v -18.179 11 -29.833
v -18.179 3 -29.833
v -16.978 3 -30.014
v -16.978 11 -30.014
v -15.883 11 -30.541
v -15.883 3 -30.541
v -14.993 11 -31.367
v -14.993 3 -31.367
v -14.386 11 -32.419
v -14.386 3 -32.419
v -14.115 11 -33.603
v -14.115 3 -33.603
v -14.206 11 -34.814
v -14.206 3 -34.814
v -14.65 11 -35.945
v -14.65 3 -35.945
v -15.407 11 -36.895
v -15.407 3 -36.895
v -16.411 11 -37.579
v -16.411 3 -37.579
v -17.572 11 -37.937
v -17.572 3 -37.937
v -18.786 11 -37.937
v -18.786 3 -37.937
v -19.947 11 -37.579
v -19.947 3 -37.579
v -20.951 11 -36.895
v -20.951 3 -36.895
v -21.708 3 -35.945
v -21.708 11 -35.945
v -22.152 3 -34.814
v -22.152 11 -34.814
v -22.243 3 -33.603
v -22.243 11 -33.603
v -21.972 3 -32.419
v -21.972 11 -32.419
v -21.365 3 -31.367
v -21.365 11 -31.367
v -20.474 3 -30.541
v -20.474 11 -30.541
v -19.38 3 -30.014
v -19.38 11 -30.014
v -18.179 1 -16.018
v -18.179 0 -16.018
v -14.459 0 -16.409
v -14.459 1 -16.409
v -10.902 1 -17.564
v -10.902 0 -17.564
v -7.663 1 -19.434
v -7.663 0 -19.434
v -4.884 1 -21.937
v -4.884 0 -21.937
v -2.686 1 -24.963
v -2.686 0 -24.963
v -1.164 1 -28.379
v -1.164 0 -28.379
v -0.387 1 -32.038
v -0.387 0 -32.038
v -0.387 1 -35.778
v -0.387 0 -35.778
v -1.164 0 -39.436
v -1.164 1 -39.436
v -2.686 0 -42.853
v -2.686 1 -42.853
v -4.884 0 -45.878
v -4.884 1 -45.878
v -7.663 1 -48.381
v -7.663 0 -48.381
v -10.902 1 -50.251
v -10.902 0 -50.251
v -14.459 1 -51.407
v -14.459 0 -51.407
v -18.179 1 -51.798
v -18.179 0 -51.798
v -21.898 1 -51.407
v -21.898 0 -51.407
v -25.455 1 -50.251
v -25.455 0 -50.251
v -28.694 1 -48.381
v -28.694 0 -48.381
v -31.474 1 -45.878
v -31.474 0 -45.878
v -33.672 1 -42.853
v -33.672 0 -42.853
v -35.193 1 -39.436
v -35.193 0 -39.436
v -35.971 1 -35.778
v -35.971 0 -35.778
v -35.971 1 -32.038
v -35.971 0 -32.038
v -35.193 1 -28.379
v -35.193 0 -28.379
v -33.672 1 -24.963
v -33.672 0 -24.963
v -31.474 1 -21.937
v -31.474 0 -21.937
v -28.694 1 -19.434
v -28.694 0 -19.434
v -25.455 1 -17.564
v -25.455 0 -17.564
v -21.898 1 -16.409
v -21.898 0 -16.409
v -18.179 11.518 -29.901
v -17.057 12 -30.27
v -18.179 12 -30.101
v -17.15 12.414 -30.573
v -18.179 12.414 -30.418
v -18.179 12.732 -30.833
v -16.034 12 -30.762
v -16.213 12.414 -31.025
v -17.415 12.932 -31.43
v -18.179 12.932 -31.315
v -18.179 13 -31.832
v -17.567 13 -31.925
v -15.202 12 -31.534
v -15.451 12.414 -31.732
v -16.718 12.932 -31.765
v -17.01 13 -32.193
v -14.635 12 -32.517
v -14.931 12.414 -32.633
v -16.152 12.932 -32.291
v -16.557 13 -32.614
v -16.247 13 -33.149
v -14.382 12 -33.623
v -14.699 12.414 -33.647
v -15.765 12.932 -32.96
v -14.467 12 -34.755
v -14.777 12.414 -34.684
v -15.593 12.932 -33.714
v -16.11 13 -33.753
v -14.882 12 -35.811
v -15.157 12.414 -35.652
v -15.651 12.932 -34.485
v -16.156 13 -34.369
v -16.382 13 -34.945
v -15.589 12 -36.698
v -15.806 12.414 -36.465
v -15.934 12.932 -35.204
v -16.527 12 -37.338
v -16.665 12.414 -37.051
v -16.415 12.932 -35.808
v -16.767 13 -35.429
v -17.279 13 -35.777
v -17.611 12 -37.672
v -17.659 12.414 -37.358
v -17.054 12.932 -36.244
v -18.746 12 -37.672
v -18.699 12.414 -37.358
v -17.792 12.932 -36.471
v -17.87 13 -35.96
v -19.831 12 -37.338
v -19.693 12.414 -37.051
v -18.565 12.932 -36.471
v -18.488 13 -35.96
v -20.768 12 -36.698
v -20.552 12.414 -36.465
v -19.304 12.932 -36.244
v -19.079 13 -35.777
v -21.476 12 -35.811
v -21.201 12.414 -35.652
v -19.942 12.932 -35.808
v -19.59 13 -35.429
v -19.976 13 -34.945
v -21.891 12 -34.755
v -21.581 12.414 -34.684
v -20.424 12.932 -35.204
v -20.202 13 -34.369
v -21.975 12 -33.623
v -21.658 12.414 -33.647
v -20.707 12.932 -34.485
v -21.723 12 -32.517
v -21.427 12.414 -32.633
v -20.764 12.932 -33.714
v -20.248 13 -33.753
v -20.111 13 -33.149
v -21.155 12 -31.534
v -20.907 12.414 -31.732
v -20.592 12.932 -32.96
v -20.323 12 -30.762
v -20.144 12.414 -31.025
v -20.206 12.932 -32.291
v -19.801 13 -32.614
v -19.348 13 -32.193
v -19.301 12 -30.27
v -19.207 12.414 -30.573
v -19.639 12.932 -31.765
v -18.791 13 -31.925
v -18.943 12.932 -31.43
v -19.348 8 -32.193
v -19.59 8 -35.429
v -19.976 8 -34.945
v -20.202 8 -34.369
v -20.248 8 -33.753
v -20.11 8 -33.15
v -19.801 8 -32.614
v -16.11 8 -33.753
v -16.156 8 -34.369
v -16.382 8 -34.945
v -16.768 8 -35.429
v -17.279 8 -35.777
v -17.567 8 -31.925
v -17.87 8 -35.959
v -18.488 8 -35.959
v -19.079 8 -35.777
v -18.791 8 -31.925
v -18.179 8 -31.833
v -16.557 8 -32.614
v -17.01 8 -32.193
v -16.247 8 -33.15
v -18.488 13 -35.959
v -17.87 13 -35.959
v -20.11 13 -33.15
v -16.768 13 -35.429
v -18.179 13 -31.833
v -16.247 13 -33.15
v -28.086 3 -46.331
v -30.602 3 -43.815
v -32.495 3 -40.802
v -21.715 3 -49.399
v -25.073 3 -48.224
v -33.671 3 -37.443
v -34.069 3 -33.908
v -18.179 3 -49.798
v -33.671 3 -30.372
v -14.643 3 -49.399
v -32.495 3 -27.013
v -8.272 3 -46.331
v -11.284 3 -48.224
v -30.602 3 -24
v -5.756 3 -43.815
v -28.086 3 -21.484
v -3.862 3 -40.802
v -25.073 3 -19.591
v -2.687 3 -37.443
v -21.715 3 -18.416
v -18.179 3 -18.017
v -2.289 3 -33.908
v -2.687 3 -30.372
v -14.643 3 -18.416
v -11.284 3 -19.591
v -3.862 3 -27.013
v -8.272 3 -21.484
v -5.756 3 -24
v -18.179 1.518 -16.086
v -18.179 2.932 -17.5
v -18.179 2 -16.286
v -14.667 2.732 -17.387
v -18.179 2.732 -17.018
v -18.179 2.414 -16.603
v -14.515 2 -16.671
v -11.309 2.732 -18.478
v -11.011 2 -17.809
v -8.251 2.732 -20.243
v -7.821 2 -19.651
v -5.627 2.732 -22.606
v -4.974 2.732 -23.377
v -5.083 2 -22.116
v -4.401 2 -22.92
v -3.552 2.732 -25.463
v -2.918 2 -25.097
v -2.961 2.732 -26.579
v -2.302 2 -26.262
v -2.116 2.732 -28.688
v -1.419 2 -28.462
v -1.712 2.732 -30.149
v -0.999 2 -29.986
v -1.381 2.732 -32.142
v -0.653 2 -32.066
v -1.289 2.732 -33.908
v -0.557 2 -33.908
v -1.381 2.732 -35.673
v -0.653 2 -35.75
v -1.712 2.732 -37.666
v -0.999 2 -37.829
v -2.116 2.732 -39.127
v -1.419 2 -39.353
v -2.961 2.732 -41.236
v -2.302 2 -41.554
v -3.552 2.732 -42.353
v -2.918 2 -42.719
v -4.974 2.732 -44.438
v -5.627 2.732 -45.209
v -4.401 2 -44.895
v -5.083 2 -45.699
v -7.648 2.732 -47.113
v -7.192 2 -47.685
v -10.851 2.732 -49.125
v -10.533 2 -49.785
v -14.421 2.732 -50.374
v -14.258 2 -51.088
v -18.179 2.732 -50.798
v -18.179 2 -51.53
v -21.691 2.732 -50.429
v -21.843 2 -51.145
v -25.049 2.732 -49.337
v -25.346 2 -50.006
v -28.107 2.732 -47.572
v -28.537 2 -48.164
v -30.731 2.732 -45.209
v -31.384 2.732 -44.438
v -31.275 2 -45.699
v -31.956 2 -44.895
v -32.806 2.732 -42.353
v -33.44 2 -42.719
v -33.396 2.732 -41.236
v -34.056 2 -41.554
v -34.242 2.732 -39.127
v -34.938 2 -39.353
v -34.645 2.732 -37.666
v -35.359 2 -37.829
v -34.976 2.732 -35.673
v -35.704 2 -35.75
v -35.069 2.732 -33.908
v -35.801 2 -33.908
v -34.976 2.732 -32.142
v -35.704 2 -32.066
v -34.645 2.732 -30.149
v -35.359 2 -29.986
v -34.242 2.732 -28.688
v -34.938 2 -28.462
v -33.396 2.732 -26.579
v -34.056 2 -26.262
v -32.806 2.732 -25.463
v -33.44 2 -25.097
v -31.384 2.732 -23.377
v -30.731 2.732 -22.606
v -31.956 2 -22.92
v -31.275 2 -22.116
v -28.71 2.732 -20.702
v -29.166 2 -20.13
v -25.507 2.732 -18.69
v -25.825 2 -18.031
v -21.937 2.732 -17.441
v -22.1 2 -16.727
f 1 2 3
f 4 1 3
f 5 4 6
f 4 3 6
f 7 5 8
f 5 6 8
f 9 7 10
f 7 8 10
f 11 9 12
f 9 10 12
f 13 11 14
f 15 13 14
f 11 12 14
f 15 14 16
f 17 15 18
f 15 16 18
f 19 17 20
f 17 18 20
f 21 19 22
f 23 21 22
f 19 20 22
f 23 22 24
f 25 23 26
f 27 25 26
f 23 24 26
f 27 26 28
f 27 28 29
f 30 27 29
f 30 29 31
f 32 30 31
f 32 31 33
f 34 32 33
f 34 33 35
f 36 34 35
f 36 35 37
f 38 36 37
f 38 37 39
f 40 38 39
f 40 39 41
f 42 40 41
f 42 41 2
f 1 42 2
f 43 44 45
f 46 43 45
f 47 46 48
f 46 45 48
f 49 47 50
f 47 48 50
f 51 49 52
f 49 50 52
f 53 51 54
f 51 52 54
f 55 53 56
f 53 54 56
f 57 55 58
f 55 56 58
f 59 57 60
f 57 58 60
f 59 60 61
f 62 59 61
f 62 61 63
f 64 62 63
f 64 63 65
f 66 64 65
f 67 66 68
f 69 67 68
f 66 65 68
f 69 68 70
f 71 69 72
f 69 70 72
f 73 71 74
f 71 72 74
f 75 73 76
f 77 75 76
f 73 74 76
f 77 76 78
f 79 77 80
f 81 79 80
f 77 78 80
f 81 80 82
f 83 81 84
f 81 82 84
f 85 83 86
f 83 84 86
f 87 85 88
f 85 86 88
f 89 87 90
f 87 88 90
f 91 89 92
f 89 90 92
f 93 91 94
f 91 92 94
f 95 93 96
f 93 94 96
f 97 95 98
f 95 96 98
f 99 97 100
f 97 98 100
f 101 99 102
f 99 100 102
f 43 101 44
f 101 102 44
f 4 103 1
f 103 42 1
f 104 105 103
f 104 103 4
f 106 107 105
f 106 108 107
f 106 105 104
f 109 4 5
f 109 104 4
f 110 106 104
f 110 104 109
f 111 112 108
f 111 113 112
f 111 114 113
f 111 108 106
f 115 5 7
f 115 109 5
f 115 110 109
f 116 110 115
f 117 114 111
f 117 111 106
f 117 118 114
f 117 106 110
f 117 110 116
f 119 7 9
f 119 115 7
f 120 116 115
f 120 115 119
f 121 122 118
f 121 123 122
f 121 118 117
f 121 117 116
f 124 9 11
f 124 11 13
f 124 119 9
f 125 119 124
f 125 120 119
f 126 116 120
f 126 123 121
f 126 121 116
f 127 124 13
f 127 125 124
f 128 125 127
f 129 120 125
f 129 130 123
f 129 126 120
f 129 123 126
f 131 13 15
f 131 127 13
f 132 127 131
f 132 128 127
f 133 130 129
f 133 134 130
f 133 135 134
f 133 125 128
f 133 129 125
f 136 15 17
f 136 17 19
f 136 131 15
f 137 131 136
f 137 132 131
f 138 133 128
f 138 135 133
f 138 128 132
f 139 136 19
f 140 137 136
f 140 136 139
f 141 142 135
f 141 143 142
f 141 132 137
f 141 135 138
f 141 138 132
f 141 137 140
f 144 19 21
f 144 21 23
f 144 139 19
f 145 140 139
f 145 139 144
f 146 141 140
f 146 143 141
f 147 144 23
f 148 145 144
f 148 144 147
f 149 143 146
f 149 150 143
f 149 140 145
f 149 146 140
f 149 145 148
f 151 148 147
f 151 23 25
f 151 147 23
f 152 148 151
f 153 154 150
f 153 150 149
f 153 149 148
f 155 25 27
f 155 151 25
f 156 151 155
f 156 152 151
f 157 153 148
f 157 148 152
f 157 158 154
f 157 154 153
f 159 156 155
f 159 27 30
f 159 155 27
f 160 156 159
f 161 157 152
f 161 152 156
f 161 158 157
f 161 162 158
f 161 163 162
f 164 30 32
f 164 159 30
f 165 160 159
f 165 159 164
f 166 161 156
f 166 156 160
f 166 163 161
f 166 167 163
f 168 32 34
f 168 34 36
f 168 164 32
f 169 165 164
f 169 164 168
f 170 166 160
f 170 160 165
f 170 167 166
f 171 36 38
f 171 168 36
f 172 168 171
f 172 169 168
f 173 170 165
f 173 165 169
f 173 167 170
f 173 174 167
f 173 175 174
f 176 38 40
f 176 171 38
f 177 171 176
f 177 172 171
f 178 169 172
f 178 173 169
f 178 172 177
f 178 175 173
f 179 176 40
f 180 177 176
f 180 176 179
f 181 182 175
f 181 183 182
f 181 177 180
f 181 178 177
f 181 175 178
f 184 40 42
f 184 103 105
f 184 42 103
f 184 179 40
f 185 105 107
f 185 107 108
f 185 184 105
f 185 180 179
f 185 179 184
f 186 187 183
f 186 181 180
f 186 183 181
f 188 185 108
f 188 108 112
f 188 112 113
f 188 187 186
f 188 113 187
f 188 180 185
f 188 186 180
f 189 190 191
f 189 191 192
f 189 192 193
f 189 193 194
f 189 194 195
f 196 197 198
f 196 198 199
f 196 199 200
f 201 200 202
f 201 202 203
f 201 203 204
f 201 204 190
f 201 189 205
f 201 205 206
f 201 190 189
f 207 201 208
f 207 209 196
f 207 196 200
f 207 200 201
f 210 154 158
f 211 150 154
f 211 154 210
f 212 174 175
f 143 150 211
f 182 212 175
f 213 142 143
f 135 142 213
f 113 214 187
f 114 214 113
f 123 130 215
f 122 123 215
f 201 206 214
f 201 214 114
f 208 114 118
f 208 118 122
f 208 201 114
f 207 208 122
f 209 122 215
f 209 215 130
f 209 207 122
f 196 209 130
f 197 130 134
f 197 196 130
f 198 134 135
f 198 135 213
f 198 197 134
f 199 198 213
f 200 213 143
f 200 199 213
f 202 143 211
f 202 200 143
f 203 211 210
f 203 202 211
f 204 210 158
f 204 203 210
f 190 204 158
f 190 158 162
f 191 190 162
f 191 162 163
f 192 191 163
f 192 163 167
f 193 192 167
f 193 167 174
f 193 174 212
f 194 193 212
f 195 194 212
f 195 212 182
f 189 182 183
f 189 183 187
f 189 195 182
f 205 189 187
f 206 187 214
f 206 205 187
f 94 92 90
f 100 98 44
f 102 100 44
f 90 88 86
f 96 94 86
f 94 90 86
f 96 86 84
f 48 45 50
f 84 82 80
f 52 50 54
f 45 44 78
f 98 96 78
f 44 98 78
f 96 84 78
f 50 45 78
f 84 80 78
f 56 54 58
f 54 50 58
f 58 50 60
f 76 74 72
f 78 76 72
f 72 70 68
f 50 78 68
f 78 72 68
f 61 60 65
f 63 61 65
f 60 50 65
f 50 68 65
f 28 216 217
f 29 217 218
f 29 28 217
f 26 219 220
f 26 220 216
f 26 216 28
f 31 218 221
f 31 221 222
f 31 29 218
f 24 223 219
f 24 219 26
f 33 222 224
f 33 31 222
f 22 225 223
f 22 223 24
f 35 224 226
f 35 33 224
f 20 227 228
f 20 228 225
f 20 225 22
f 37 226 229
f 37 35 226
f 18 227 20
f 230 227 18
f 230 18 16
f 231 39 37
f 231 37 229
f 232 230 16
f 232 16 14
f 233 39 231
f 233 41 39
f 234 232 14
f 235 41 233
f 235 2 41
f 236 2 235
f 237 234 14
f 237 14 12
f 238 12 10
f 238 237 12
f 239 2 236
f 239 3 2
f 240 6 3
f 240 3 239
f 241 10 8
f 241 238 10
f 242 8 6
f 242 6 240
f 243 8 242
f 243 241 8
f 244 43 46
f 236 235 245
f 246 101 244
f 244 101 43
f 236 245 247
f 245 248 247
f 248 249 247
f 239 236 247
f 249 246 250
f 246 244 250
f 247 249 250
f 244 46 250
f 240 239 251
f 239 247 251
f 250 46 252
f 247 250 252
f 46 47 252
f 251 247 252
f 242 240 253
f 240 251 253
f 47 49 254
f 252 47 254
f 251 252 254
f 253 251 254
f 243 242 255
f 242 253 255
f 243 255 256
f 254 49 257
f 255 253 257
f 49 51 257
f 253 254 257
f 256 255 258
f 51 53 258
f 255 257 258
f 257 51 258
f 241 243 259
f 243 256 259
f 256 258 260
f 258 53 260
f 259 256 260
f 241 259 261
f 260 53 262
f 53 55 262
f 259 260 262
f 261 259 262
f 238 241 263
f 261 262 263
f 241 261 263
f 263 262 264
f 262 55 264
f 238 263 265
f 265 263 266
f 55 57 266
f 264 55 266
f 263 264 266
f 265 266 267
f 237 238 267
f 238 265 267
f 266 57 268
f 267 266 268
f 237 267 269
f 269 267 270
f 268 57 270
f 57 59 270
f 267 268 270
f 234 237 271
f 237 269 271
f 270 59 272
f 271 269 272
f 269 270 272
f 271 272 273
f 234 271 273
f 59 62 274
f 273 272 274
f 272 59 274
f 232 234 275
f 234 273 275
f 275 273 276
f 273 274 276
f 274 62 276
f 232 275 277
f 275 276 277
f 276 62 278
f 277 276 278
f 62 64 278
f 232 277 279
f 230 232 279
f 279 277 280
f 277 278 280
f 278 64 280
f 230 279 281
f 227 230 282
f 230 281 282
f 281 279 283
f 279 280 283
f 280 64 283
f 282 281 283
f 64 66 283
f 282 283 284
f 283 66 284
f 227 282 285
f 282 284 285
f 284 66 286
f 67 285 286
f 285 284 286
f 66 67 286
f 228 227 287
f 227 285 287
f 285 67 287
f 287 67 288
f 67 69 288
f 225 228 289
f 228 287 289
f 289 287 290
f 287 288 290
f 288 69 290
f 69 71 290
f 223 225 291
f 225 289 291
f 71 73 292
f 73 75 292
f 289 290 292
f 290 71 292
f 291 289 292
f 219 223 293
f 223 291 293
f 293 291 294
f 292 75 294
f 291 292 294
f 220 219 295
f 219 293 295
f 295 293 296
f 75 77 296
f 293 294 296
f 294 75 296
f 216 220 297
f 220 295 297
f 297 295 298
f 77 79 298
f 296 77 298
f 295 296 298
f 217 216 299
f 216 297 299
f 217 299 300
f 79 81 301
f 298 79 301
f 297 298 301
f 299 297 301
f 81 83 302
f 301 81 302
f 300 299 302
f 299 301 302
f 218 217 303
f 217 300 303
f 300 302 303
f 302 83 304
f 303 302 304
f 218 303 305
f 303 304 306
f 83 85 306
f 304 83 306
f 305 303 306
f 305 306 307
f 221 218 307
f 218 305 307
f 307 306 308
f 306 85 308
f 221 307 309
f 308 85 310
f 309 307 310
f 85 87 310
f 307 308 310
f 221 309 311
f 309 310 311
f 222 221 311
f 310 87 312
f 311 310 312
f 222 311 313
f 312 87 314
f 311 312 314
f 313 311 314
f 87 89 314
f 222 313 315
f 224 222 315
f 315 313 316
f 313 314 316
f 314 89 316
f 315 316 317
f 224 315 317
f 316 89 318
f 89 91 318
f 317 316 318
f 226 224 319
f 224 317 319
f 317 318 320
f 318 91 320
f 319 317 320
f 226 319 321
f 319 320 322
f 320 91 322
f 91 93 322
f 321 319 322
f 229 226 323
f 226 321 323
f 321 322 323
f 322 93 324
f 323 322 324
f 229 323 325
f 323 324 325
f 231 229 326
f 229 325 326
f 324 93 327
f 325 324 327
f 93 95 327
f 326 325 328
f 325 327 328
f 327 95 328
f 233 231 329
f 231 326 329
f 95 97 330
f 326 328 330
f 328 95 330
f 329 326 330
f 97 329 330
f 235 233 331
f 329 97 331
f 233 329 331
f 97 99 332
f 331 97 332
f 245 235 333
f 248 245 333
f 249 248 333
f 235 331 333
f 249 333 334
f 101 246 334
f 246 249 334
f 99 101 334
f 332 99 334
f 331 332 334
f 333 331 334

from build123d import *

# Parameters (mm, degrees)
SKETCH1_R           = 17.89
SKETCH1_R_2         = 4.075
SKETCH1_R_3         = 2.075
BOSS_EXTRUDE1_DEPTH = 3
BOSS_EXTRUDE2_START = 3
SKETCH1_4_R         = 4.075
SKETCH1_4_R_2       = 2.075
BOSS_EXTRUDE2_DEPTH = 5
BOSS_EXTRUDE3_START = 8
SKETCH1_5_R         = 4.075
SKETCH1_5_R_2       = 2.075
BOSS_EXTRUDE3_DEPTH = 5
FILLET1_R           = 2


with BuildPart() as part:
    # Sketch1 → Boss-Extrude1 (new body)
    # profile 1 of 3: a face of its own
    with BuildSketch(Plane(origin=(0, 0, 0), x_dir=(1, 0, 0), z_dir=(0, 1, 0))):
        with Locations(Location((-18.178896686, 33.907594253, 0), (0, 0, 270))):
            Circle(SKETCH1_R)
        with Locations((-18.178896686, 33.907594253)):
            Circle(SKETCH1_R_2, mode=Mode.SUBTRACT)
    # profile 2 of 3: a face of its own
    with BuildSketch(Plane(origin=(0, 0, 0), x_dir=(1, 0, 0), z_dir=(0, 1, 0))):
        with Locations((-18.178896686, 33.907594253)):
            Circle(SKETCH1_R_2)
        with Locations((-18.178896686, 33.907594253)):
            Circle(SKETCH1_R_3, mode=Mode.SUBTRACT)
    # profile 3 of 3: a face of its own
    with BuildSketch(Plane(origin=(0, 0, 0), x_dir=(1, 0, 0), z_dir=(0, 1, 0))):
        with Locations((-18.178896686, 33.907594253)):
            Circle(SKETCH1_R_3)
    extrude(amount=BOSS_EXTRUDE1_DEPTH)

    # Sketch1<4> → Boss-Extrude2 (add)
    # profile 1 of 2: a face of its own
    with BuildSketch(Plane(origin=(0, 0, 0), x_dir=(1, 0, 0), z_dir=(0, 1, 0)).offset(BOSS_EXTRUDE2_START)):
        with Locations(Location((-18.178896686, 33.907594253, 0), (0, 0, 270))):
            Circle(SKETCH1_4_R)
        with Locations((-18.178896686, 33.907594253)):
            Circle(SKETCH1_4_R_2, mode=Mode.SUBTRACT)
    # profile 2 of 2: a face of its own
    with BuildSketch(Plane(origin=(0, 0, 0), x_dir=(1, 0, 0), z_dir=(0, 1, 0)).offset(BOSS_EXTRUDE2_START)):
        with Locations((-18.178896686, 33.907594253)):
            Circle(SKETCH1_4_R_2)
    extrude(amount=BOSS_EXTRUDE2_DEPTH)

    # Sketch1<5> → Boss-Extrude3 (add)
    with BuildSketch(Plane(origin=(0, 0, 0), x_dir=(1, 0, 0), z_dir=(0, 1, 0)).offset(BOSS_EXTRUDE3_START)):
        with Locations(Location((-18.178896686, 33.907594253, 0), (0, 0, 270))):
            Circle(SKETCH1_5_R)
        with Locations(Location((-18.178896686, 33.907594253, 0), (0, 0, 270))):
            Circle(SKETCH1_5_R_2, mode=Mode.SUBTRACT)
    extrude(amount=BOSS_EXTRUDE3_DEPTH)

    # Fillet1
    fillet1_edges = [part.edges().sort_by_distance(p)[0] for p in [
        (-18.178896686, 13, -37.982594253),
        (-18.178896686, 3, -51.797594253),
    ]]
    fillet(fillet1_edges, radius=FILLET1_R - 0.0001)  # a hair under: the kernel refuses the full size


solid = part.part
